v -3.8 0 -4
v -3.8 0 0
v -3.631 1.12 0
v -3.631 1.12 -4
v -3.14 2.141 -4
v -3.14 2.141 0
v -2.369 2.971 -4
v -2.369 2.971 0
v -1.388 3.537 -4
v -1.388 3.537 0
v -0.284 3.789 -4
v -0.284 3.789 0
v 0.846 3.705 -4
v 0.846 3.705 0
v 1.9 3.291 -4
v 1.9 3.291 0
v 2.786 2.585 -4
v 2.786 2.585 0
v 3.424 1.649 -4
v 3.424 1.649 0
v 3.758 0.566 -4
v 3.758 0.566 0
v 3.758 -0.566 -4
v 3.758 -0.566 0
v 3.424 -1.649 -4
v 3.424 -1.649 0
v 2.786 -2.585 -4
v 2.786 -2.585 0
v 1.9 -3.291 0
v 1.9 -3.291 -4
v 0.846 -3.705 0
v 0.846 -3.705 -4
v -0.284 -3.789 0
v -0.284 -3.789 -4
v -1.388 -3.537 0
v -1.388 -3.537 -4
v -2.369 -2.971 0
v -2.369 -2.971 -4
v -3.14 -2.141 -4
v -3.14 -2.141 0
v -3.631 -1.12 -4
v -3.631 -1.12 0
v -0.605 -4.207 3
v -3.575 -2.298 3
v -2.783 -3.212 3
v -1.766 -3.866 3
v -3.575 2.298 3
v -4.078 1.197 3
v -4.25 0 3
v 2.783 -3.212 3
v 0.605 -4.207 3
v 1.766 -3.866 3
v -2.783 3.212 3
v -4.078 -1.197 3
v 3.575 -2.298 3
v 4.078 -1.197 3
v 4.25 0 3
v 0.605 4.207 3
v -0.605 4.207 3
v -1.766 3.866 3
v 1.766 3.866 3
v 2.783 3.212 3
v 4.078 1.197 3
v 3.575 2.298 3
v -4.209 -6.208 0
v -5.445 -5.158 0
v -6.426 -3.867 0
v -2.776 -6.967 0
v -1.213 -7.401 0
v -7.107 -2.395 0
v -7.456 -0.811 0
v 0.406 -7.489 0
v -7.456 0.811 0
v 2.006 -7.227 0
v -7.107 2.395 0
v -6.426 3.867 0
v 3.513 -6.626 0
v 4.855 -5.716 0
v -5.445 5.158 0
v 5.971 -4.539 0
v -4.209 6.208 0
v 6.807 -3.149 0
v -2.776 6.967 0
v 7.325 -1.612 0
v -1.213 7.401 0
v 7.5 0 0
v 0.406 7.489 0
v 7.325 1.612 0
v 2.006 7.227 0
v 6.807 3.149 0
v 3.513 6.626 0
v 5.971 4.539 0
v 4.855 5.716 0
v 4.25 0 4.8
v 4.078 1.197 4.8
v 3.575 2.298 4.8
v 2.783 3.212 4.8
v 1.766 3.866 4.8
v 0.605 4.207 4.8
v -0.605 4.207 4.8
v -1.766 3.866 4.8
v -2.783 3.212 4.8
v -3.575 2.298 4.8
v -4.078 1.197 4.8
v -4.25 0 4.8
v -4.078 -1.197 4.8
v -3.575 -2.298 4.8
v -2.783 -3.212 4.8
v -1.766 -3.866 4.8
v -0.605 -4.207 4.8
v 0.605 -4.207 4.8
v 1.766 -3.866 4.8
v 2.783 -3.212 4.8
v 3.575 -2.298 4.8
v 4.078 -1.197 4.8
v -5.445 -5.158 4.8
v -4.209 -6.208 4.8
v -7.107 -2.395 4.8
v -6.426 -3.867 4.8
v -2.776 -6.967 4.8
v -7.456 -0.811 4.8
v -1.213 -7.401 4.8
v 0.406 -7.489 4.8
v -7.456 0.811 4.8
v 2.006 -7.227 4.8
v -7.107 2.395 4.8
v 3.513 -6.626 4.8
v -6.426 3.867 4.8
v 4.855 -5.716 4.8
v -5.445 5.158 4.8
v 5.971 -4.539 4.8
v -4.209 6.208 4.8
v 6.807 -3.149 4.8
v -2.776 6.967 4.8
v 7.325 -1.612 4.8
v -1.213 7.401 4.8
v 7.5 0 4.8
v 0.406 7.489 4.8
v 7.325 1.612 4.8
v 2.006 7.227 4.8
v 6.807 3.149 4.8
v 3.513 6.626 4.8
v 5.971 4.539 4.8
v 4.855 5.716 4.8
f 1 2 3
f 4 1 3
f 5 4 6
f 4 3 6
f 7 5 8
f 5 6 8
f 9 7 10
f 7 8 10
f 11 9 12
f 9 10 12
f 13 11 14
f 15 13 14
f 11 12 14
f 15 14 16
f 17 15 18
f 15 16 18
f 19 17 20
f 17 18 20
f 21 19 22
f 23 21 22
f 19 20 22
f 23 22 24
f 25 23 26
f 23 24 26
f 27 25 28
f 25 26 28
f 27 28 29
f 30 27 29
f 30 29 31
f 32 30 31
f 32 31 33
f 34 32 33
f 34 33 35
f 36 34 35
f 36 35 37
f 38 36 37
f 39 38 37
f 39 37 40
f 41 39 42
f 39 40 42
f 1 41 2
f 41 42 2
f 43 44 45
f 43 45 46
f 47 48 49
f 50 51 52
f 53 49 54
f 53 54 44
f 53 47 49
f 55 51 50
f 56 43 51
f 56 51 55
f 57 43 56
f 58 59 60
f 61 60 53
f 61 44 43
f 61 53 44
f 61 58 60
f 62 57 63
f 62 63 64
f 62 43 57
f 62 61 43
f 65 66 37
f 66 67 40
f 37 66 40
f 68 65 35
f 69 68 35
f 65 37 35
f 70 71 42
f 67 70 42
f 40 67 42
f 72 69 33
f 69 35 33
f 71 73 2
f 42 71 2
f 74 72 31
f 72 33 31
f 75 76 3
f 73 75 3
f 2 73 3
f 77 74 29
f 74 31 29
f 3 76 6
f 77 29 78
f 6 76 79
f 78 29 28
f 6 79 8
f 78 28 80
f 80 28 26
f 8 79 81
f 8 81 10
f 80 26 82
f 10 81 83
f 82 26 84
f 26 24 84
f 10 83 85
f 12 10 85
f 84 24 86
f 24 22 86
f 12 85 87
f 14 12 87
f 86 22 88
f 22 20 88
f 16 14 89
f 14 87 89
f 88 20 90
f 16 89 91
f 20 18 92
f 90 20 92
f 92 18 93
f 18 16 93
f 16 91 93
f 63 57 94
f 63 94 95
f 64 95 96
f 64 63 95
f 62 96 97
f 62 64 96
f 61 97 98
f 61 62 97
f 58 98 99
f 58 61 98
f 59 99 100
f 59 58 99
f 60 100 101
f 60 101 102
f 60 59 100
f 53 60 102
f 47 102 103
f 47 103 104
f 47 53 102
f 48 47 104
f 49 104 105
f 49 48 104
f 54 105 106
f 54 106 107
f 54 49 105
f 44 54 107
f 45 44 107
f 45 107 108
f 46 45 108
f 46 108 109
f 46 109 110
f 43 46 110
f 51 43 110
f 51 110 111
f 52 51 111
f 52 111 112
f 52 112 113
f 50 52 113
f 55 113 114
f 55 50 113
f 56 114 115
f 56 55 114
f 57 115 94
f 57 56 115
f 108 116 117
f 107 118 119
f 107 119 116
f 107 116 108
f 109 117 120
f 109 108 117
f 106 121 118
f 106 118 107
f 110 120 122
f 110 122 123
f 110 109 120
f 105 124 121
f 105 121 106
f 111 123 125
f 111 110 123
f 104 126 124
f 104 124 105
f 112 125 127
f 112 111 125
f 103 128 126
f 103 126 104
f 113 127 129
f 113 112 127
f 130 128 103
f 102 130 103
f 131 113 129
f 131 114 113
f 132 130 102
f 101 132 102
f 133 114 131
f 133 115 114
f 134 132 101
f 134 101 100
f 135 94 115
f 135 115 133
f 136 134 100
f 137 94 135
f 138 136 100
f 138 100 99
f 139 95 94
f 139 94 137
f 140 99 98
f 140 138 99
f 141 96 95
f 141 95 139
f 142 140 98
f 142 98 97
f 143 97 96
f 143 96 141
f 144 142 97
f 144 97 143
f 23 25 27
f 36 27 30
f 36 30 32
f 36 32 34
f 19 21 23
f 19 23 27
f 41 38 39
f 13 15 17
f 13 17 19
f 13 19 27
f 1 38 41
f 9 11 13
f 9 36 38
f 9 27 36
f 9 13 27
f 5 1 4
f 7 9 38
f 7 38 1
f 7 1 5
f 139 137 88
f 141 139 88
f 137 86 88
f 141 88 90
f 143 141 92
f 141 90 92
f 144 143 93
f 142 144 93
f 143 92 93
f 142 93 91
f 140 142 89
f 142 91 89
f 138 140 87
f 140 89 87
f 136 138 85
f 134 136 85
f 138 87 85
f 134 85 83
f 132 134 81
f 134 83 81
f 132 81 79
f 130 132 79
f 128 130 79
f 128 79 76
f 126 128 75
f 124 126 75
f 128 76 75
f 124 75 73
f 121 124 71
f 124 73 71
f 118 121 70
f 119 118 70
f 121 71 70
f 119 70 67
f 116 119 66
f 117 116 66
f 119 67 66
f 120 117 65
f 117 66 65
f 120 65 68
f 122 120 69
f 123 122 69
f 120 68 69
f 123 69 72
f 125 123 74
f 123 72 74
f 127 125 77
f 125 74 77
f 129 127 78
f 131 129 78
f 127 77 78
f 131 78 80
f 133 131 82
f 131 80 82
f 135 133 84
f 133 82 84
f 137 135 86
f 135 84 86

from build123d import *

# Parameters (mm, degrees)
SZKIC1_R                    = 7.5
DODANIE_WYCI_GNI_CIE1_DEPTH = 3
SZKIC2_R                    = 3.8
DODANIE_WYCI_GNI_CIE2_DEPTH = 4
SZKIC3_R                    = 7.5
SZKIC3_R_2                  = 4.25
DODANIE_WYCI_GNI_CIE3_DEPTH = 1.8


with BuildPart() as part:
    # Szkic1 → Dodanie-wyciągnięcie1 (new body)
    with BuildSketch(Plane.XY):
        Circle(SZKIC1_R)
    extrude(amount=DODANIE_WYCI_GNI_CIE1_DEPTH)

    # Szkic2 → Dodanie-wyciągnięcie2 (add)
    with BuildSketch(Plane(origin=(0, 0, 0), x_dir=(-1, 0, 0), z_dir=(0, 0, -1))):
        Circle(SZKIC2_R)
    extrude(amount=DODANIE_WYCI_GNI_CIE2_DEPTH)

    # Szkic3 → Dodanie-wyciągnięcie3 (add)
    with BuildSketch(Plane.XY.offset(3)):
        Circle(SZKIC3_R)
        Circle(SZKIC3_R_2, mode=Mode.SUBTRACT)
    extrude(amount=DODANIE_WYCI_GNI_CIE3_DEPTH)


solid = part.part
